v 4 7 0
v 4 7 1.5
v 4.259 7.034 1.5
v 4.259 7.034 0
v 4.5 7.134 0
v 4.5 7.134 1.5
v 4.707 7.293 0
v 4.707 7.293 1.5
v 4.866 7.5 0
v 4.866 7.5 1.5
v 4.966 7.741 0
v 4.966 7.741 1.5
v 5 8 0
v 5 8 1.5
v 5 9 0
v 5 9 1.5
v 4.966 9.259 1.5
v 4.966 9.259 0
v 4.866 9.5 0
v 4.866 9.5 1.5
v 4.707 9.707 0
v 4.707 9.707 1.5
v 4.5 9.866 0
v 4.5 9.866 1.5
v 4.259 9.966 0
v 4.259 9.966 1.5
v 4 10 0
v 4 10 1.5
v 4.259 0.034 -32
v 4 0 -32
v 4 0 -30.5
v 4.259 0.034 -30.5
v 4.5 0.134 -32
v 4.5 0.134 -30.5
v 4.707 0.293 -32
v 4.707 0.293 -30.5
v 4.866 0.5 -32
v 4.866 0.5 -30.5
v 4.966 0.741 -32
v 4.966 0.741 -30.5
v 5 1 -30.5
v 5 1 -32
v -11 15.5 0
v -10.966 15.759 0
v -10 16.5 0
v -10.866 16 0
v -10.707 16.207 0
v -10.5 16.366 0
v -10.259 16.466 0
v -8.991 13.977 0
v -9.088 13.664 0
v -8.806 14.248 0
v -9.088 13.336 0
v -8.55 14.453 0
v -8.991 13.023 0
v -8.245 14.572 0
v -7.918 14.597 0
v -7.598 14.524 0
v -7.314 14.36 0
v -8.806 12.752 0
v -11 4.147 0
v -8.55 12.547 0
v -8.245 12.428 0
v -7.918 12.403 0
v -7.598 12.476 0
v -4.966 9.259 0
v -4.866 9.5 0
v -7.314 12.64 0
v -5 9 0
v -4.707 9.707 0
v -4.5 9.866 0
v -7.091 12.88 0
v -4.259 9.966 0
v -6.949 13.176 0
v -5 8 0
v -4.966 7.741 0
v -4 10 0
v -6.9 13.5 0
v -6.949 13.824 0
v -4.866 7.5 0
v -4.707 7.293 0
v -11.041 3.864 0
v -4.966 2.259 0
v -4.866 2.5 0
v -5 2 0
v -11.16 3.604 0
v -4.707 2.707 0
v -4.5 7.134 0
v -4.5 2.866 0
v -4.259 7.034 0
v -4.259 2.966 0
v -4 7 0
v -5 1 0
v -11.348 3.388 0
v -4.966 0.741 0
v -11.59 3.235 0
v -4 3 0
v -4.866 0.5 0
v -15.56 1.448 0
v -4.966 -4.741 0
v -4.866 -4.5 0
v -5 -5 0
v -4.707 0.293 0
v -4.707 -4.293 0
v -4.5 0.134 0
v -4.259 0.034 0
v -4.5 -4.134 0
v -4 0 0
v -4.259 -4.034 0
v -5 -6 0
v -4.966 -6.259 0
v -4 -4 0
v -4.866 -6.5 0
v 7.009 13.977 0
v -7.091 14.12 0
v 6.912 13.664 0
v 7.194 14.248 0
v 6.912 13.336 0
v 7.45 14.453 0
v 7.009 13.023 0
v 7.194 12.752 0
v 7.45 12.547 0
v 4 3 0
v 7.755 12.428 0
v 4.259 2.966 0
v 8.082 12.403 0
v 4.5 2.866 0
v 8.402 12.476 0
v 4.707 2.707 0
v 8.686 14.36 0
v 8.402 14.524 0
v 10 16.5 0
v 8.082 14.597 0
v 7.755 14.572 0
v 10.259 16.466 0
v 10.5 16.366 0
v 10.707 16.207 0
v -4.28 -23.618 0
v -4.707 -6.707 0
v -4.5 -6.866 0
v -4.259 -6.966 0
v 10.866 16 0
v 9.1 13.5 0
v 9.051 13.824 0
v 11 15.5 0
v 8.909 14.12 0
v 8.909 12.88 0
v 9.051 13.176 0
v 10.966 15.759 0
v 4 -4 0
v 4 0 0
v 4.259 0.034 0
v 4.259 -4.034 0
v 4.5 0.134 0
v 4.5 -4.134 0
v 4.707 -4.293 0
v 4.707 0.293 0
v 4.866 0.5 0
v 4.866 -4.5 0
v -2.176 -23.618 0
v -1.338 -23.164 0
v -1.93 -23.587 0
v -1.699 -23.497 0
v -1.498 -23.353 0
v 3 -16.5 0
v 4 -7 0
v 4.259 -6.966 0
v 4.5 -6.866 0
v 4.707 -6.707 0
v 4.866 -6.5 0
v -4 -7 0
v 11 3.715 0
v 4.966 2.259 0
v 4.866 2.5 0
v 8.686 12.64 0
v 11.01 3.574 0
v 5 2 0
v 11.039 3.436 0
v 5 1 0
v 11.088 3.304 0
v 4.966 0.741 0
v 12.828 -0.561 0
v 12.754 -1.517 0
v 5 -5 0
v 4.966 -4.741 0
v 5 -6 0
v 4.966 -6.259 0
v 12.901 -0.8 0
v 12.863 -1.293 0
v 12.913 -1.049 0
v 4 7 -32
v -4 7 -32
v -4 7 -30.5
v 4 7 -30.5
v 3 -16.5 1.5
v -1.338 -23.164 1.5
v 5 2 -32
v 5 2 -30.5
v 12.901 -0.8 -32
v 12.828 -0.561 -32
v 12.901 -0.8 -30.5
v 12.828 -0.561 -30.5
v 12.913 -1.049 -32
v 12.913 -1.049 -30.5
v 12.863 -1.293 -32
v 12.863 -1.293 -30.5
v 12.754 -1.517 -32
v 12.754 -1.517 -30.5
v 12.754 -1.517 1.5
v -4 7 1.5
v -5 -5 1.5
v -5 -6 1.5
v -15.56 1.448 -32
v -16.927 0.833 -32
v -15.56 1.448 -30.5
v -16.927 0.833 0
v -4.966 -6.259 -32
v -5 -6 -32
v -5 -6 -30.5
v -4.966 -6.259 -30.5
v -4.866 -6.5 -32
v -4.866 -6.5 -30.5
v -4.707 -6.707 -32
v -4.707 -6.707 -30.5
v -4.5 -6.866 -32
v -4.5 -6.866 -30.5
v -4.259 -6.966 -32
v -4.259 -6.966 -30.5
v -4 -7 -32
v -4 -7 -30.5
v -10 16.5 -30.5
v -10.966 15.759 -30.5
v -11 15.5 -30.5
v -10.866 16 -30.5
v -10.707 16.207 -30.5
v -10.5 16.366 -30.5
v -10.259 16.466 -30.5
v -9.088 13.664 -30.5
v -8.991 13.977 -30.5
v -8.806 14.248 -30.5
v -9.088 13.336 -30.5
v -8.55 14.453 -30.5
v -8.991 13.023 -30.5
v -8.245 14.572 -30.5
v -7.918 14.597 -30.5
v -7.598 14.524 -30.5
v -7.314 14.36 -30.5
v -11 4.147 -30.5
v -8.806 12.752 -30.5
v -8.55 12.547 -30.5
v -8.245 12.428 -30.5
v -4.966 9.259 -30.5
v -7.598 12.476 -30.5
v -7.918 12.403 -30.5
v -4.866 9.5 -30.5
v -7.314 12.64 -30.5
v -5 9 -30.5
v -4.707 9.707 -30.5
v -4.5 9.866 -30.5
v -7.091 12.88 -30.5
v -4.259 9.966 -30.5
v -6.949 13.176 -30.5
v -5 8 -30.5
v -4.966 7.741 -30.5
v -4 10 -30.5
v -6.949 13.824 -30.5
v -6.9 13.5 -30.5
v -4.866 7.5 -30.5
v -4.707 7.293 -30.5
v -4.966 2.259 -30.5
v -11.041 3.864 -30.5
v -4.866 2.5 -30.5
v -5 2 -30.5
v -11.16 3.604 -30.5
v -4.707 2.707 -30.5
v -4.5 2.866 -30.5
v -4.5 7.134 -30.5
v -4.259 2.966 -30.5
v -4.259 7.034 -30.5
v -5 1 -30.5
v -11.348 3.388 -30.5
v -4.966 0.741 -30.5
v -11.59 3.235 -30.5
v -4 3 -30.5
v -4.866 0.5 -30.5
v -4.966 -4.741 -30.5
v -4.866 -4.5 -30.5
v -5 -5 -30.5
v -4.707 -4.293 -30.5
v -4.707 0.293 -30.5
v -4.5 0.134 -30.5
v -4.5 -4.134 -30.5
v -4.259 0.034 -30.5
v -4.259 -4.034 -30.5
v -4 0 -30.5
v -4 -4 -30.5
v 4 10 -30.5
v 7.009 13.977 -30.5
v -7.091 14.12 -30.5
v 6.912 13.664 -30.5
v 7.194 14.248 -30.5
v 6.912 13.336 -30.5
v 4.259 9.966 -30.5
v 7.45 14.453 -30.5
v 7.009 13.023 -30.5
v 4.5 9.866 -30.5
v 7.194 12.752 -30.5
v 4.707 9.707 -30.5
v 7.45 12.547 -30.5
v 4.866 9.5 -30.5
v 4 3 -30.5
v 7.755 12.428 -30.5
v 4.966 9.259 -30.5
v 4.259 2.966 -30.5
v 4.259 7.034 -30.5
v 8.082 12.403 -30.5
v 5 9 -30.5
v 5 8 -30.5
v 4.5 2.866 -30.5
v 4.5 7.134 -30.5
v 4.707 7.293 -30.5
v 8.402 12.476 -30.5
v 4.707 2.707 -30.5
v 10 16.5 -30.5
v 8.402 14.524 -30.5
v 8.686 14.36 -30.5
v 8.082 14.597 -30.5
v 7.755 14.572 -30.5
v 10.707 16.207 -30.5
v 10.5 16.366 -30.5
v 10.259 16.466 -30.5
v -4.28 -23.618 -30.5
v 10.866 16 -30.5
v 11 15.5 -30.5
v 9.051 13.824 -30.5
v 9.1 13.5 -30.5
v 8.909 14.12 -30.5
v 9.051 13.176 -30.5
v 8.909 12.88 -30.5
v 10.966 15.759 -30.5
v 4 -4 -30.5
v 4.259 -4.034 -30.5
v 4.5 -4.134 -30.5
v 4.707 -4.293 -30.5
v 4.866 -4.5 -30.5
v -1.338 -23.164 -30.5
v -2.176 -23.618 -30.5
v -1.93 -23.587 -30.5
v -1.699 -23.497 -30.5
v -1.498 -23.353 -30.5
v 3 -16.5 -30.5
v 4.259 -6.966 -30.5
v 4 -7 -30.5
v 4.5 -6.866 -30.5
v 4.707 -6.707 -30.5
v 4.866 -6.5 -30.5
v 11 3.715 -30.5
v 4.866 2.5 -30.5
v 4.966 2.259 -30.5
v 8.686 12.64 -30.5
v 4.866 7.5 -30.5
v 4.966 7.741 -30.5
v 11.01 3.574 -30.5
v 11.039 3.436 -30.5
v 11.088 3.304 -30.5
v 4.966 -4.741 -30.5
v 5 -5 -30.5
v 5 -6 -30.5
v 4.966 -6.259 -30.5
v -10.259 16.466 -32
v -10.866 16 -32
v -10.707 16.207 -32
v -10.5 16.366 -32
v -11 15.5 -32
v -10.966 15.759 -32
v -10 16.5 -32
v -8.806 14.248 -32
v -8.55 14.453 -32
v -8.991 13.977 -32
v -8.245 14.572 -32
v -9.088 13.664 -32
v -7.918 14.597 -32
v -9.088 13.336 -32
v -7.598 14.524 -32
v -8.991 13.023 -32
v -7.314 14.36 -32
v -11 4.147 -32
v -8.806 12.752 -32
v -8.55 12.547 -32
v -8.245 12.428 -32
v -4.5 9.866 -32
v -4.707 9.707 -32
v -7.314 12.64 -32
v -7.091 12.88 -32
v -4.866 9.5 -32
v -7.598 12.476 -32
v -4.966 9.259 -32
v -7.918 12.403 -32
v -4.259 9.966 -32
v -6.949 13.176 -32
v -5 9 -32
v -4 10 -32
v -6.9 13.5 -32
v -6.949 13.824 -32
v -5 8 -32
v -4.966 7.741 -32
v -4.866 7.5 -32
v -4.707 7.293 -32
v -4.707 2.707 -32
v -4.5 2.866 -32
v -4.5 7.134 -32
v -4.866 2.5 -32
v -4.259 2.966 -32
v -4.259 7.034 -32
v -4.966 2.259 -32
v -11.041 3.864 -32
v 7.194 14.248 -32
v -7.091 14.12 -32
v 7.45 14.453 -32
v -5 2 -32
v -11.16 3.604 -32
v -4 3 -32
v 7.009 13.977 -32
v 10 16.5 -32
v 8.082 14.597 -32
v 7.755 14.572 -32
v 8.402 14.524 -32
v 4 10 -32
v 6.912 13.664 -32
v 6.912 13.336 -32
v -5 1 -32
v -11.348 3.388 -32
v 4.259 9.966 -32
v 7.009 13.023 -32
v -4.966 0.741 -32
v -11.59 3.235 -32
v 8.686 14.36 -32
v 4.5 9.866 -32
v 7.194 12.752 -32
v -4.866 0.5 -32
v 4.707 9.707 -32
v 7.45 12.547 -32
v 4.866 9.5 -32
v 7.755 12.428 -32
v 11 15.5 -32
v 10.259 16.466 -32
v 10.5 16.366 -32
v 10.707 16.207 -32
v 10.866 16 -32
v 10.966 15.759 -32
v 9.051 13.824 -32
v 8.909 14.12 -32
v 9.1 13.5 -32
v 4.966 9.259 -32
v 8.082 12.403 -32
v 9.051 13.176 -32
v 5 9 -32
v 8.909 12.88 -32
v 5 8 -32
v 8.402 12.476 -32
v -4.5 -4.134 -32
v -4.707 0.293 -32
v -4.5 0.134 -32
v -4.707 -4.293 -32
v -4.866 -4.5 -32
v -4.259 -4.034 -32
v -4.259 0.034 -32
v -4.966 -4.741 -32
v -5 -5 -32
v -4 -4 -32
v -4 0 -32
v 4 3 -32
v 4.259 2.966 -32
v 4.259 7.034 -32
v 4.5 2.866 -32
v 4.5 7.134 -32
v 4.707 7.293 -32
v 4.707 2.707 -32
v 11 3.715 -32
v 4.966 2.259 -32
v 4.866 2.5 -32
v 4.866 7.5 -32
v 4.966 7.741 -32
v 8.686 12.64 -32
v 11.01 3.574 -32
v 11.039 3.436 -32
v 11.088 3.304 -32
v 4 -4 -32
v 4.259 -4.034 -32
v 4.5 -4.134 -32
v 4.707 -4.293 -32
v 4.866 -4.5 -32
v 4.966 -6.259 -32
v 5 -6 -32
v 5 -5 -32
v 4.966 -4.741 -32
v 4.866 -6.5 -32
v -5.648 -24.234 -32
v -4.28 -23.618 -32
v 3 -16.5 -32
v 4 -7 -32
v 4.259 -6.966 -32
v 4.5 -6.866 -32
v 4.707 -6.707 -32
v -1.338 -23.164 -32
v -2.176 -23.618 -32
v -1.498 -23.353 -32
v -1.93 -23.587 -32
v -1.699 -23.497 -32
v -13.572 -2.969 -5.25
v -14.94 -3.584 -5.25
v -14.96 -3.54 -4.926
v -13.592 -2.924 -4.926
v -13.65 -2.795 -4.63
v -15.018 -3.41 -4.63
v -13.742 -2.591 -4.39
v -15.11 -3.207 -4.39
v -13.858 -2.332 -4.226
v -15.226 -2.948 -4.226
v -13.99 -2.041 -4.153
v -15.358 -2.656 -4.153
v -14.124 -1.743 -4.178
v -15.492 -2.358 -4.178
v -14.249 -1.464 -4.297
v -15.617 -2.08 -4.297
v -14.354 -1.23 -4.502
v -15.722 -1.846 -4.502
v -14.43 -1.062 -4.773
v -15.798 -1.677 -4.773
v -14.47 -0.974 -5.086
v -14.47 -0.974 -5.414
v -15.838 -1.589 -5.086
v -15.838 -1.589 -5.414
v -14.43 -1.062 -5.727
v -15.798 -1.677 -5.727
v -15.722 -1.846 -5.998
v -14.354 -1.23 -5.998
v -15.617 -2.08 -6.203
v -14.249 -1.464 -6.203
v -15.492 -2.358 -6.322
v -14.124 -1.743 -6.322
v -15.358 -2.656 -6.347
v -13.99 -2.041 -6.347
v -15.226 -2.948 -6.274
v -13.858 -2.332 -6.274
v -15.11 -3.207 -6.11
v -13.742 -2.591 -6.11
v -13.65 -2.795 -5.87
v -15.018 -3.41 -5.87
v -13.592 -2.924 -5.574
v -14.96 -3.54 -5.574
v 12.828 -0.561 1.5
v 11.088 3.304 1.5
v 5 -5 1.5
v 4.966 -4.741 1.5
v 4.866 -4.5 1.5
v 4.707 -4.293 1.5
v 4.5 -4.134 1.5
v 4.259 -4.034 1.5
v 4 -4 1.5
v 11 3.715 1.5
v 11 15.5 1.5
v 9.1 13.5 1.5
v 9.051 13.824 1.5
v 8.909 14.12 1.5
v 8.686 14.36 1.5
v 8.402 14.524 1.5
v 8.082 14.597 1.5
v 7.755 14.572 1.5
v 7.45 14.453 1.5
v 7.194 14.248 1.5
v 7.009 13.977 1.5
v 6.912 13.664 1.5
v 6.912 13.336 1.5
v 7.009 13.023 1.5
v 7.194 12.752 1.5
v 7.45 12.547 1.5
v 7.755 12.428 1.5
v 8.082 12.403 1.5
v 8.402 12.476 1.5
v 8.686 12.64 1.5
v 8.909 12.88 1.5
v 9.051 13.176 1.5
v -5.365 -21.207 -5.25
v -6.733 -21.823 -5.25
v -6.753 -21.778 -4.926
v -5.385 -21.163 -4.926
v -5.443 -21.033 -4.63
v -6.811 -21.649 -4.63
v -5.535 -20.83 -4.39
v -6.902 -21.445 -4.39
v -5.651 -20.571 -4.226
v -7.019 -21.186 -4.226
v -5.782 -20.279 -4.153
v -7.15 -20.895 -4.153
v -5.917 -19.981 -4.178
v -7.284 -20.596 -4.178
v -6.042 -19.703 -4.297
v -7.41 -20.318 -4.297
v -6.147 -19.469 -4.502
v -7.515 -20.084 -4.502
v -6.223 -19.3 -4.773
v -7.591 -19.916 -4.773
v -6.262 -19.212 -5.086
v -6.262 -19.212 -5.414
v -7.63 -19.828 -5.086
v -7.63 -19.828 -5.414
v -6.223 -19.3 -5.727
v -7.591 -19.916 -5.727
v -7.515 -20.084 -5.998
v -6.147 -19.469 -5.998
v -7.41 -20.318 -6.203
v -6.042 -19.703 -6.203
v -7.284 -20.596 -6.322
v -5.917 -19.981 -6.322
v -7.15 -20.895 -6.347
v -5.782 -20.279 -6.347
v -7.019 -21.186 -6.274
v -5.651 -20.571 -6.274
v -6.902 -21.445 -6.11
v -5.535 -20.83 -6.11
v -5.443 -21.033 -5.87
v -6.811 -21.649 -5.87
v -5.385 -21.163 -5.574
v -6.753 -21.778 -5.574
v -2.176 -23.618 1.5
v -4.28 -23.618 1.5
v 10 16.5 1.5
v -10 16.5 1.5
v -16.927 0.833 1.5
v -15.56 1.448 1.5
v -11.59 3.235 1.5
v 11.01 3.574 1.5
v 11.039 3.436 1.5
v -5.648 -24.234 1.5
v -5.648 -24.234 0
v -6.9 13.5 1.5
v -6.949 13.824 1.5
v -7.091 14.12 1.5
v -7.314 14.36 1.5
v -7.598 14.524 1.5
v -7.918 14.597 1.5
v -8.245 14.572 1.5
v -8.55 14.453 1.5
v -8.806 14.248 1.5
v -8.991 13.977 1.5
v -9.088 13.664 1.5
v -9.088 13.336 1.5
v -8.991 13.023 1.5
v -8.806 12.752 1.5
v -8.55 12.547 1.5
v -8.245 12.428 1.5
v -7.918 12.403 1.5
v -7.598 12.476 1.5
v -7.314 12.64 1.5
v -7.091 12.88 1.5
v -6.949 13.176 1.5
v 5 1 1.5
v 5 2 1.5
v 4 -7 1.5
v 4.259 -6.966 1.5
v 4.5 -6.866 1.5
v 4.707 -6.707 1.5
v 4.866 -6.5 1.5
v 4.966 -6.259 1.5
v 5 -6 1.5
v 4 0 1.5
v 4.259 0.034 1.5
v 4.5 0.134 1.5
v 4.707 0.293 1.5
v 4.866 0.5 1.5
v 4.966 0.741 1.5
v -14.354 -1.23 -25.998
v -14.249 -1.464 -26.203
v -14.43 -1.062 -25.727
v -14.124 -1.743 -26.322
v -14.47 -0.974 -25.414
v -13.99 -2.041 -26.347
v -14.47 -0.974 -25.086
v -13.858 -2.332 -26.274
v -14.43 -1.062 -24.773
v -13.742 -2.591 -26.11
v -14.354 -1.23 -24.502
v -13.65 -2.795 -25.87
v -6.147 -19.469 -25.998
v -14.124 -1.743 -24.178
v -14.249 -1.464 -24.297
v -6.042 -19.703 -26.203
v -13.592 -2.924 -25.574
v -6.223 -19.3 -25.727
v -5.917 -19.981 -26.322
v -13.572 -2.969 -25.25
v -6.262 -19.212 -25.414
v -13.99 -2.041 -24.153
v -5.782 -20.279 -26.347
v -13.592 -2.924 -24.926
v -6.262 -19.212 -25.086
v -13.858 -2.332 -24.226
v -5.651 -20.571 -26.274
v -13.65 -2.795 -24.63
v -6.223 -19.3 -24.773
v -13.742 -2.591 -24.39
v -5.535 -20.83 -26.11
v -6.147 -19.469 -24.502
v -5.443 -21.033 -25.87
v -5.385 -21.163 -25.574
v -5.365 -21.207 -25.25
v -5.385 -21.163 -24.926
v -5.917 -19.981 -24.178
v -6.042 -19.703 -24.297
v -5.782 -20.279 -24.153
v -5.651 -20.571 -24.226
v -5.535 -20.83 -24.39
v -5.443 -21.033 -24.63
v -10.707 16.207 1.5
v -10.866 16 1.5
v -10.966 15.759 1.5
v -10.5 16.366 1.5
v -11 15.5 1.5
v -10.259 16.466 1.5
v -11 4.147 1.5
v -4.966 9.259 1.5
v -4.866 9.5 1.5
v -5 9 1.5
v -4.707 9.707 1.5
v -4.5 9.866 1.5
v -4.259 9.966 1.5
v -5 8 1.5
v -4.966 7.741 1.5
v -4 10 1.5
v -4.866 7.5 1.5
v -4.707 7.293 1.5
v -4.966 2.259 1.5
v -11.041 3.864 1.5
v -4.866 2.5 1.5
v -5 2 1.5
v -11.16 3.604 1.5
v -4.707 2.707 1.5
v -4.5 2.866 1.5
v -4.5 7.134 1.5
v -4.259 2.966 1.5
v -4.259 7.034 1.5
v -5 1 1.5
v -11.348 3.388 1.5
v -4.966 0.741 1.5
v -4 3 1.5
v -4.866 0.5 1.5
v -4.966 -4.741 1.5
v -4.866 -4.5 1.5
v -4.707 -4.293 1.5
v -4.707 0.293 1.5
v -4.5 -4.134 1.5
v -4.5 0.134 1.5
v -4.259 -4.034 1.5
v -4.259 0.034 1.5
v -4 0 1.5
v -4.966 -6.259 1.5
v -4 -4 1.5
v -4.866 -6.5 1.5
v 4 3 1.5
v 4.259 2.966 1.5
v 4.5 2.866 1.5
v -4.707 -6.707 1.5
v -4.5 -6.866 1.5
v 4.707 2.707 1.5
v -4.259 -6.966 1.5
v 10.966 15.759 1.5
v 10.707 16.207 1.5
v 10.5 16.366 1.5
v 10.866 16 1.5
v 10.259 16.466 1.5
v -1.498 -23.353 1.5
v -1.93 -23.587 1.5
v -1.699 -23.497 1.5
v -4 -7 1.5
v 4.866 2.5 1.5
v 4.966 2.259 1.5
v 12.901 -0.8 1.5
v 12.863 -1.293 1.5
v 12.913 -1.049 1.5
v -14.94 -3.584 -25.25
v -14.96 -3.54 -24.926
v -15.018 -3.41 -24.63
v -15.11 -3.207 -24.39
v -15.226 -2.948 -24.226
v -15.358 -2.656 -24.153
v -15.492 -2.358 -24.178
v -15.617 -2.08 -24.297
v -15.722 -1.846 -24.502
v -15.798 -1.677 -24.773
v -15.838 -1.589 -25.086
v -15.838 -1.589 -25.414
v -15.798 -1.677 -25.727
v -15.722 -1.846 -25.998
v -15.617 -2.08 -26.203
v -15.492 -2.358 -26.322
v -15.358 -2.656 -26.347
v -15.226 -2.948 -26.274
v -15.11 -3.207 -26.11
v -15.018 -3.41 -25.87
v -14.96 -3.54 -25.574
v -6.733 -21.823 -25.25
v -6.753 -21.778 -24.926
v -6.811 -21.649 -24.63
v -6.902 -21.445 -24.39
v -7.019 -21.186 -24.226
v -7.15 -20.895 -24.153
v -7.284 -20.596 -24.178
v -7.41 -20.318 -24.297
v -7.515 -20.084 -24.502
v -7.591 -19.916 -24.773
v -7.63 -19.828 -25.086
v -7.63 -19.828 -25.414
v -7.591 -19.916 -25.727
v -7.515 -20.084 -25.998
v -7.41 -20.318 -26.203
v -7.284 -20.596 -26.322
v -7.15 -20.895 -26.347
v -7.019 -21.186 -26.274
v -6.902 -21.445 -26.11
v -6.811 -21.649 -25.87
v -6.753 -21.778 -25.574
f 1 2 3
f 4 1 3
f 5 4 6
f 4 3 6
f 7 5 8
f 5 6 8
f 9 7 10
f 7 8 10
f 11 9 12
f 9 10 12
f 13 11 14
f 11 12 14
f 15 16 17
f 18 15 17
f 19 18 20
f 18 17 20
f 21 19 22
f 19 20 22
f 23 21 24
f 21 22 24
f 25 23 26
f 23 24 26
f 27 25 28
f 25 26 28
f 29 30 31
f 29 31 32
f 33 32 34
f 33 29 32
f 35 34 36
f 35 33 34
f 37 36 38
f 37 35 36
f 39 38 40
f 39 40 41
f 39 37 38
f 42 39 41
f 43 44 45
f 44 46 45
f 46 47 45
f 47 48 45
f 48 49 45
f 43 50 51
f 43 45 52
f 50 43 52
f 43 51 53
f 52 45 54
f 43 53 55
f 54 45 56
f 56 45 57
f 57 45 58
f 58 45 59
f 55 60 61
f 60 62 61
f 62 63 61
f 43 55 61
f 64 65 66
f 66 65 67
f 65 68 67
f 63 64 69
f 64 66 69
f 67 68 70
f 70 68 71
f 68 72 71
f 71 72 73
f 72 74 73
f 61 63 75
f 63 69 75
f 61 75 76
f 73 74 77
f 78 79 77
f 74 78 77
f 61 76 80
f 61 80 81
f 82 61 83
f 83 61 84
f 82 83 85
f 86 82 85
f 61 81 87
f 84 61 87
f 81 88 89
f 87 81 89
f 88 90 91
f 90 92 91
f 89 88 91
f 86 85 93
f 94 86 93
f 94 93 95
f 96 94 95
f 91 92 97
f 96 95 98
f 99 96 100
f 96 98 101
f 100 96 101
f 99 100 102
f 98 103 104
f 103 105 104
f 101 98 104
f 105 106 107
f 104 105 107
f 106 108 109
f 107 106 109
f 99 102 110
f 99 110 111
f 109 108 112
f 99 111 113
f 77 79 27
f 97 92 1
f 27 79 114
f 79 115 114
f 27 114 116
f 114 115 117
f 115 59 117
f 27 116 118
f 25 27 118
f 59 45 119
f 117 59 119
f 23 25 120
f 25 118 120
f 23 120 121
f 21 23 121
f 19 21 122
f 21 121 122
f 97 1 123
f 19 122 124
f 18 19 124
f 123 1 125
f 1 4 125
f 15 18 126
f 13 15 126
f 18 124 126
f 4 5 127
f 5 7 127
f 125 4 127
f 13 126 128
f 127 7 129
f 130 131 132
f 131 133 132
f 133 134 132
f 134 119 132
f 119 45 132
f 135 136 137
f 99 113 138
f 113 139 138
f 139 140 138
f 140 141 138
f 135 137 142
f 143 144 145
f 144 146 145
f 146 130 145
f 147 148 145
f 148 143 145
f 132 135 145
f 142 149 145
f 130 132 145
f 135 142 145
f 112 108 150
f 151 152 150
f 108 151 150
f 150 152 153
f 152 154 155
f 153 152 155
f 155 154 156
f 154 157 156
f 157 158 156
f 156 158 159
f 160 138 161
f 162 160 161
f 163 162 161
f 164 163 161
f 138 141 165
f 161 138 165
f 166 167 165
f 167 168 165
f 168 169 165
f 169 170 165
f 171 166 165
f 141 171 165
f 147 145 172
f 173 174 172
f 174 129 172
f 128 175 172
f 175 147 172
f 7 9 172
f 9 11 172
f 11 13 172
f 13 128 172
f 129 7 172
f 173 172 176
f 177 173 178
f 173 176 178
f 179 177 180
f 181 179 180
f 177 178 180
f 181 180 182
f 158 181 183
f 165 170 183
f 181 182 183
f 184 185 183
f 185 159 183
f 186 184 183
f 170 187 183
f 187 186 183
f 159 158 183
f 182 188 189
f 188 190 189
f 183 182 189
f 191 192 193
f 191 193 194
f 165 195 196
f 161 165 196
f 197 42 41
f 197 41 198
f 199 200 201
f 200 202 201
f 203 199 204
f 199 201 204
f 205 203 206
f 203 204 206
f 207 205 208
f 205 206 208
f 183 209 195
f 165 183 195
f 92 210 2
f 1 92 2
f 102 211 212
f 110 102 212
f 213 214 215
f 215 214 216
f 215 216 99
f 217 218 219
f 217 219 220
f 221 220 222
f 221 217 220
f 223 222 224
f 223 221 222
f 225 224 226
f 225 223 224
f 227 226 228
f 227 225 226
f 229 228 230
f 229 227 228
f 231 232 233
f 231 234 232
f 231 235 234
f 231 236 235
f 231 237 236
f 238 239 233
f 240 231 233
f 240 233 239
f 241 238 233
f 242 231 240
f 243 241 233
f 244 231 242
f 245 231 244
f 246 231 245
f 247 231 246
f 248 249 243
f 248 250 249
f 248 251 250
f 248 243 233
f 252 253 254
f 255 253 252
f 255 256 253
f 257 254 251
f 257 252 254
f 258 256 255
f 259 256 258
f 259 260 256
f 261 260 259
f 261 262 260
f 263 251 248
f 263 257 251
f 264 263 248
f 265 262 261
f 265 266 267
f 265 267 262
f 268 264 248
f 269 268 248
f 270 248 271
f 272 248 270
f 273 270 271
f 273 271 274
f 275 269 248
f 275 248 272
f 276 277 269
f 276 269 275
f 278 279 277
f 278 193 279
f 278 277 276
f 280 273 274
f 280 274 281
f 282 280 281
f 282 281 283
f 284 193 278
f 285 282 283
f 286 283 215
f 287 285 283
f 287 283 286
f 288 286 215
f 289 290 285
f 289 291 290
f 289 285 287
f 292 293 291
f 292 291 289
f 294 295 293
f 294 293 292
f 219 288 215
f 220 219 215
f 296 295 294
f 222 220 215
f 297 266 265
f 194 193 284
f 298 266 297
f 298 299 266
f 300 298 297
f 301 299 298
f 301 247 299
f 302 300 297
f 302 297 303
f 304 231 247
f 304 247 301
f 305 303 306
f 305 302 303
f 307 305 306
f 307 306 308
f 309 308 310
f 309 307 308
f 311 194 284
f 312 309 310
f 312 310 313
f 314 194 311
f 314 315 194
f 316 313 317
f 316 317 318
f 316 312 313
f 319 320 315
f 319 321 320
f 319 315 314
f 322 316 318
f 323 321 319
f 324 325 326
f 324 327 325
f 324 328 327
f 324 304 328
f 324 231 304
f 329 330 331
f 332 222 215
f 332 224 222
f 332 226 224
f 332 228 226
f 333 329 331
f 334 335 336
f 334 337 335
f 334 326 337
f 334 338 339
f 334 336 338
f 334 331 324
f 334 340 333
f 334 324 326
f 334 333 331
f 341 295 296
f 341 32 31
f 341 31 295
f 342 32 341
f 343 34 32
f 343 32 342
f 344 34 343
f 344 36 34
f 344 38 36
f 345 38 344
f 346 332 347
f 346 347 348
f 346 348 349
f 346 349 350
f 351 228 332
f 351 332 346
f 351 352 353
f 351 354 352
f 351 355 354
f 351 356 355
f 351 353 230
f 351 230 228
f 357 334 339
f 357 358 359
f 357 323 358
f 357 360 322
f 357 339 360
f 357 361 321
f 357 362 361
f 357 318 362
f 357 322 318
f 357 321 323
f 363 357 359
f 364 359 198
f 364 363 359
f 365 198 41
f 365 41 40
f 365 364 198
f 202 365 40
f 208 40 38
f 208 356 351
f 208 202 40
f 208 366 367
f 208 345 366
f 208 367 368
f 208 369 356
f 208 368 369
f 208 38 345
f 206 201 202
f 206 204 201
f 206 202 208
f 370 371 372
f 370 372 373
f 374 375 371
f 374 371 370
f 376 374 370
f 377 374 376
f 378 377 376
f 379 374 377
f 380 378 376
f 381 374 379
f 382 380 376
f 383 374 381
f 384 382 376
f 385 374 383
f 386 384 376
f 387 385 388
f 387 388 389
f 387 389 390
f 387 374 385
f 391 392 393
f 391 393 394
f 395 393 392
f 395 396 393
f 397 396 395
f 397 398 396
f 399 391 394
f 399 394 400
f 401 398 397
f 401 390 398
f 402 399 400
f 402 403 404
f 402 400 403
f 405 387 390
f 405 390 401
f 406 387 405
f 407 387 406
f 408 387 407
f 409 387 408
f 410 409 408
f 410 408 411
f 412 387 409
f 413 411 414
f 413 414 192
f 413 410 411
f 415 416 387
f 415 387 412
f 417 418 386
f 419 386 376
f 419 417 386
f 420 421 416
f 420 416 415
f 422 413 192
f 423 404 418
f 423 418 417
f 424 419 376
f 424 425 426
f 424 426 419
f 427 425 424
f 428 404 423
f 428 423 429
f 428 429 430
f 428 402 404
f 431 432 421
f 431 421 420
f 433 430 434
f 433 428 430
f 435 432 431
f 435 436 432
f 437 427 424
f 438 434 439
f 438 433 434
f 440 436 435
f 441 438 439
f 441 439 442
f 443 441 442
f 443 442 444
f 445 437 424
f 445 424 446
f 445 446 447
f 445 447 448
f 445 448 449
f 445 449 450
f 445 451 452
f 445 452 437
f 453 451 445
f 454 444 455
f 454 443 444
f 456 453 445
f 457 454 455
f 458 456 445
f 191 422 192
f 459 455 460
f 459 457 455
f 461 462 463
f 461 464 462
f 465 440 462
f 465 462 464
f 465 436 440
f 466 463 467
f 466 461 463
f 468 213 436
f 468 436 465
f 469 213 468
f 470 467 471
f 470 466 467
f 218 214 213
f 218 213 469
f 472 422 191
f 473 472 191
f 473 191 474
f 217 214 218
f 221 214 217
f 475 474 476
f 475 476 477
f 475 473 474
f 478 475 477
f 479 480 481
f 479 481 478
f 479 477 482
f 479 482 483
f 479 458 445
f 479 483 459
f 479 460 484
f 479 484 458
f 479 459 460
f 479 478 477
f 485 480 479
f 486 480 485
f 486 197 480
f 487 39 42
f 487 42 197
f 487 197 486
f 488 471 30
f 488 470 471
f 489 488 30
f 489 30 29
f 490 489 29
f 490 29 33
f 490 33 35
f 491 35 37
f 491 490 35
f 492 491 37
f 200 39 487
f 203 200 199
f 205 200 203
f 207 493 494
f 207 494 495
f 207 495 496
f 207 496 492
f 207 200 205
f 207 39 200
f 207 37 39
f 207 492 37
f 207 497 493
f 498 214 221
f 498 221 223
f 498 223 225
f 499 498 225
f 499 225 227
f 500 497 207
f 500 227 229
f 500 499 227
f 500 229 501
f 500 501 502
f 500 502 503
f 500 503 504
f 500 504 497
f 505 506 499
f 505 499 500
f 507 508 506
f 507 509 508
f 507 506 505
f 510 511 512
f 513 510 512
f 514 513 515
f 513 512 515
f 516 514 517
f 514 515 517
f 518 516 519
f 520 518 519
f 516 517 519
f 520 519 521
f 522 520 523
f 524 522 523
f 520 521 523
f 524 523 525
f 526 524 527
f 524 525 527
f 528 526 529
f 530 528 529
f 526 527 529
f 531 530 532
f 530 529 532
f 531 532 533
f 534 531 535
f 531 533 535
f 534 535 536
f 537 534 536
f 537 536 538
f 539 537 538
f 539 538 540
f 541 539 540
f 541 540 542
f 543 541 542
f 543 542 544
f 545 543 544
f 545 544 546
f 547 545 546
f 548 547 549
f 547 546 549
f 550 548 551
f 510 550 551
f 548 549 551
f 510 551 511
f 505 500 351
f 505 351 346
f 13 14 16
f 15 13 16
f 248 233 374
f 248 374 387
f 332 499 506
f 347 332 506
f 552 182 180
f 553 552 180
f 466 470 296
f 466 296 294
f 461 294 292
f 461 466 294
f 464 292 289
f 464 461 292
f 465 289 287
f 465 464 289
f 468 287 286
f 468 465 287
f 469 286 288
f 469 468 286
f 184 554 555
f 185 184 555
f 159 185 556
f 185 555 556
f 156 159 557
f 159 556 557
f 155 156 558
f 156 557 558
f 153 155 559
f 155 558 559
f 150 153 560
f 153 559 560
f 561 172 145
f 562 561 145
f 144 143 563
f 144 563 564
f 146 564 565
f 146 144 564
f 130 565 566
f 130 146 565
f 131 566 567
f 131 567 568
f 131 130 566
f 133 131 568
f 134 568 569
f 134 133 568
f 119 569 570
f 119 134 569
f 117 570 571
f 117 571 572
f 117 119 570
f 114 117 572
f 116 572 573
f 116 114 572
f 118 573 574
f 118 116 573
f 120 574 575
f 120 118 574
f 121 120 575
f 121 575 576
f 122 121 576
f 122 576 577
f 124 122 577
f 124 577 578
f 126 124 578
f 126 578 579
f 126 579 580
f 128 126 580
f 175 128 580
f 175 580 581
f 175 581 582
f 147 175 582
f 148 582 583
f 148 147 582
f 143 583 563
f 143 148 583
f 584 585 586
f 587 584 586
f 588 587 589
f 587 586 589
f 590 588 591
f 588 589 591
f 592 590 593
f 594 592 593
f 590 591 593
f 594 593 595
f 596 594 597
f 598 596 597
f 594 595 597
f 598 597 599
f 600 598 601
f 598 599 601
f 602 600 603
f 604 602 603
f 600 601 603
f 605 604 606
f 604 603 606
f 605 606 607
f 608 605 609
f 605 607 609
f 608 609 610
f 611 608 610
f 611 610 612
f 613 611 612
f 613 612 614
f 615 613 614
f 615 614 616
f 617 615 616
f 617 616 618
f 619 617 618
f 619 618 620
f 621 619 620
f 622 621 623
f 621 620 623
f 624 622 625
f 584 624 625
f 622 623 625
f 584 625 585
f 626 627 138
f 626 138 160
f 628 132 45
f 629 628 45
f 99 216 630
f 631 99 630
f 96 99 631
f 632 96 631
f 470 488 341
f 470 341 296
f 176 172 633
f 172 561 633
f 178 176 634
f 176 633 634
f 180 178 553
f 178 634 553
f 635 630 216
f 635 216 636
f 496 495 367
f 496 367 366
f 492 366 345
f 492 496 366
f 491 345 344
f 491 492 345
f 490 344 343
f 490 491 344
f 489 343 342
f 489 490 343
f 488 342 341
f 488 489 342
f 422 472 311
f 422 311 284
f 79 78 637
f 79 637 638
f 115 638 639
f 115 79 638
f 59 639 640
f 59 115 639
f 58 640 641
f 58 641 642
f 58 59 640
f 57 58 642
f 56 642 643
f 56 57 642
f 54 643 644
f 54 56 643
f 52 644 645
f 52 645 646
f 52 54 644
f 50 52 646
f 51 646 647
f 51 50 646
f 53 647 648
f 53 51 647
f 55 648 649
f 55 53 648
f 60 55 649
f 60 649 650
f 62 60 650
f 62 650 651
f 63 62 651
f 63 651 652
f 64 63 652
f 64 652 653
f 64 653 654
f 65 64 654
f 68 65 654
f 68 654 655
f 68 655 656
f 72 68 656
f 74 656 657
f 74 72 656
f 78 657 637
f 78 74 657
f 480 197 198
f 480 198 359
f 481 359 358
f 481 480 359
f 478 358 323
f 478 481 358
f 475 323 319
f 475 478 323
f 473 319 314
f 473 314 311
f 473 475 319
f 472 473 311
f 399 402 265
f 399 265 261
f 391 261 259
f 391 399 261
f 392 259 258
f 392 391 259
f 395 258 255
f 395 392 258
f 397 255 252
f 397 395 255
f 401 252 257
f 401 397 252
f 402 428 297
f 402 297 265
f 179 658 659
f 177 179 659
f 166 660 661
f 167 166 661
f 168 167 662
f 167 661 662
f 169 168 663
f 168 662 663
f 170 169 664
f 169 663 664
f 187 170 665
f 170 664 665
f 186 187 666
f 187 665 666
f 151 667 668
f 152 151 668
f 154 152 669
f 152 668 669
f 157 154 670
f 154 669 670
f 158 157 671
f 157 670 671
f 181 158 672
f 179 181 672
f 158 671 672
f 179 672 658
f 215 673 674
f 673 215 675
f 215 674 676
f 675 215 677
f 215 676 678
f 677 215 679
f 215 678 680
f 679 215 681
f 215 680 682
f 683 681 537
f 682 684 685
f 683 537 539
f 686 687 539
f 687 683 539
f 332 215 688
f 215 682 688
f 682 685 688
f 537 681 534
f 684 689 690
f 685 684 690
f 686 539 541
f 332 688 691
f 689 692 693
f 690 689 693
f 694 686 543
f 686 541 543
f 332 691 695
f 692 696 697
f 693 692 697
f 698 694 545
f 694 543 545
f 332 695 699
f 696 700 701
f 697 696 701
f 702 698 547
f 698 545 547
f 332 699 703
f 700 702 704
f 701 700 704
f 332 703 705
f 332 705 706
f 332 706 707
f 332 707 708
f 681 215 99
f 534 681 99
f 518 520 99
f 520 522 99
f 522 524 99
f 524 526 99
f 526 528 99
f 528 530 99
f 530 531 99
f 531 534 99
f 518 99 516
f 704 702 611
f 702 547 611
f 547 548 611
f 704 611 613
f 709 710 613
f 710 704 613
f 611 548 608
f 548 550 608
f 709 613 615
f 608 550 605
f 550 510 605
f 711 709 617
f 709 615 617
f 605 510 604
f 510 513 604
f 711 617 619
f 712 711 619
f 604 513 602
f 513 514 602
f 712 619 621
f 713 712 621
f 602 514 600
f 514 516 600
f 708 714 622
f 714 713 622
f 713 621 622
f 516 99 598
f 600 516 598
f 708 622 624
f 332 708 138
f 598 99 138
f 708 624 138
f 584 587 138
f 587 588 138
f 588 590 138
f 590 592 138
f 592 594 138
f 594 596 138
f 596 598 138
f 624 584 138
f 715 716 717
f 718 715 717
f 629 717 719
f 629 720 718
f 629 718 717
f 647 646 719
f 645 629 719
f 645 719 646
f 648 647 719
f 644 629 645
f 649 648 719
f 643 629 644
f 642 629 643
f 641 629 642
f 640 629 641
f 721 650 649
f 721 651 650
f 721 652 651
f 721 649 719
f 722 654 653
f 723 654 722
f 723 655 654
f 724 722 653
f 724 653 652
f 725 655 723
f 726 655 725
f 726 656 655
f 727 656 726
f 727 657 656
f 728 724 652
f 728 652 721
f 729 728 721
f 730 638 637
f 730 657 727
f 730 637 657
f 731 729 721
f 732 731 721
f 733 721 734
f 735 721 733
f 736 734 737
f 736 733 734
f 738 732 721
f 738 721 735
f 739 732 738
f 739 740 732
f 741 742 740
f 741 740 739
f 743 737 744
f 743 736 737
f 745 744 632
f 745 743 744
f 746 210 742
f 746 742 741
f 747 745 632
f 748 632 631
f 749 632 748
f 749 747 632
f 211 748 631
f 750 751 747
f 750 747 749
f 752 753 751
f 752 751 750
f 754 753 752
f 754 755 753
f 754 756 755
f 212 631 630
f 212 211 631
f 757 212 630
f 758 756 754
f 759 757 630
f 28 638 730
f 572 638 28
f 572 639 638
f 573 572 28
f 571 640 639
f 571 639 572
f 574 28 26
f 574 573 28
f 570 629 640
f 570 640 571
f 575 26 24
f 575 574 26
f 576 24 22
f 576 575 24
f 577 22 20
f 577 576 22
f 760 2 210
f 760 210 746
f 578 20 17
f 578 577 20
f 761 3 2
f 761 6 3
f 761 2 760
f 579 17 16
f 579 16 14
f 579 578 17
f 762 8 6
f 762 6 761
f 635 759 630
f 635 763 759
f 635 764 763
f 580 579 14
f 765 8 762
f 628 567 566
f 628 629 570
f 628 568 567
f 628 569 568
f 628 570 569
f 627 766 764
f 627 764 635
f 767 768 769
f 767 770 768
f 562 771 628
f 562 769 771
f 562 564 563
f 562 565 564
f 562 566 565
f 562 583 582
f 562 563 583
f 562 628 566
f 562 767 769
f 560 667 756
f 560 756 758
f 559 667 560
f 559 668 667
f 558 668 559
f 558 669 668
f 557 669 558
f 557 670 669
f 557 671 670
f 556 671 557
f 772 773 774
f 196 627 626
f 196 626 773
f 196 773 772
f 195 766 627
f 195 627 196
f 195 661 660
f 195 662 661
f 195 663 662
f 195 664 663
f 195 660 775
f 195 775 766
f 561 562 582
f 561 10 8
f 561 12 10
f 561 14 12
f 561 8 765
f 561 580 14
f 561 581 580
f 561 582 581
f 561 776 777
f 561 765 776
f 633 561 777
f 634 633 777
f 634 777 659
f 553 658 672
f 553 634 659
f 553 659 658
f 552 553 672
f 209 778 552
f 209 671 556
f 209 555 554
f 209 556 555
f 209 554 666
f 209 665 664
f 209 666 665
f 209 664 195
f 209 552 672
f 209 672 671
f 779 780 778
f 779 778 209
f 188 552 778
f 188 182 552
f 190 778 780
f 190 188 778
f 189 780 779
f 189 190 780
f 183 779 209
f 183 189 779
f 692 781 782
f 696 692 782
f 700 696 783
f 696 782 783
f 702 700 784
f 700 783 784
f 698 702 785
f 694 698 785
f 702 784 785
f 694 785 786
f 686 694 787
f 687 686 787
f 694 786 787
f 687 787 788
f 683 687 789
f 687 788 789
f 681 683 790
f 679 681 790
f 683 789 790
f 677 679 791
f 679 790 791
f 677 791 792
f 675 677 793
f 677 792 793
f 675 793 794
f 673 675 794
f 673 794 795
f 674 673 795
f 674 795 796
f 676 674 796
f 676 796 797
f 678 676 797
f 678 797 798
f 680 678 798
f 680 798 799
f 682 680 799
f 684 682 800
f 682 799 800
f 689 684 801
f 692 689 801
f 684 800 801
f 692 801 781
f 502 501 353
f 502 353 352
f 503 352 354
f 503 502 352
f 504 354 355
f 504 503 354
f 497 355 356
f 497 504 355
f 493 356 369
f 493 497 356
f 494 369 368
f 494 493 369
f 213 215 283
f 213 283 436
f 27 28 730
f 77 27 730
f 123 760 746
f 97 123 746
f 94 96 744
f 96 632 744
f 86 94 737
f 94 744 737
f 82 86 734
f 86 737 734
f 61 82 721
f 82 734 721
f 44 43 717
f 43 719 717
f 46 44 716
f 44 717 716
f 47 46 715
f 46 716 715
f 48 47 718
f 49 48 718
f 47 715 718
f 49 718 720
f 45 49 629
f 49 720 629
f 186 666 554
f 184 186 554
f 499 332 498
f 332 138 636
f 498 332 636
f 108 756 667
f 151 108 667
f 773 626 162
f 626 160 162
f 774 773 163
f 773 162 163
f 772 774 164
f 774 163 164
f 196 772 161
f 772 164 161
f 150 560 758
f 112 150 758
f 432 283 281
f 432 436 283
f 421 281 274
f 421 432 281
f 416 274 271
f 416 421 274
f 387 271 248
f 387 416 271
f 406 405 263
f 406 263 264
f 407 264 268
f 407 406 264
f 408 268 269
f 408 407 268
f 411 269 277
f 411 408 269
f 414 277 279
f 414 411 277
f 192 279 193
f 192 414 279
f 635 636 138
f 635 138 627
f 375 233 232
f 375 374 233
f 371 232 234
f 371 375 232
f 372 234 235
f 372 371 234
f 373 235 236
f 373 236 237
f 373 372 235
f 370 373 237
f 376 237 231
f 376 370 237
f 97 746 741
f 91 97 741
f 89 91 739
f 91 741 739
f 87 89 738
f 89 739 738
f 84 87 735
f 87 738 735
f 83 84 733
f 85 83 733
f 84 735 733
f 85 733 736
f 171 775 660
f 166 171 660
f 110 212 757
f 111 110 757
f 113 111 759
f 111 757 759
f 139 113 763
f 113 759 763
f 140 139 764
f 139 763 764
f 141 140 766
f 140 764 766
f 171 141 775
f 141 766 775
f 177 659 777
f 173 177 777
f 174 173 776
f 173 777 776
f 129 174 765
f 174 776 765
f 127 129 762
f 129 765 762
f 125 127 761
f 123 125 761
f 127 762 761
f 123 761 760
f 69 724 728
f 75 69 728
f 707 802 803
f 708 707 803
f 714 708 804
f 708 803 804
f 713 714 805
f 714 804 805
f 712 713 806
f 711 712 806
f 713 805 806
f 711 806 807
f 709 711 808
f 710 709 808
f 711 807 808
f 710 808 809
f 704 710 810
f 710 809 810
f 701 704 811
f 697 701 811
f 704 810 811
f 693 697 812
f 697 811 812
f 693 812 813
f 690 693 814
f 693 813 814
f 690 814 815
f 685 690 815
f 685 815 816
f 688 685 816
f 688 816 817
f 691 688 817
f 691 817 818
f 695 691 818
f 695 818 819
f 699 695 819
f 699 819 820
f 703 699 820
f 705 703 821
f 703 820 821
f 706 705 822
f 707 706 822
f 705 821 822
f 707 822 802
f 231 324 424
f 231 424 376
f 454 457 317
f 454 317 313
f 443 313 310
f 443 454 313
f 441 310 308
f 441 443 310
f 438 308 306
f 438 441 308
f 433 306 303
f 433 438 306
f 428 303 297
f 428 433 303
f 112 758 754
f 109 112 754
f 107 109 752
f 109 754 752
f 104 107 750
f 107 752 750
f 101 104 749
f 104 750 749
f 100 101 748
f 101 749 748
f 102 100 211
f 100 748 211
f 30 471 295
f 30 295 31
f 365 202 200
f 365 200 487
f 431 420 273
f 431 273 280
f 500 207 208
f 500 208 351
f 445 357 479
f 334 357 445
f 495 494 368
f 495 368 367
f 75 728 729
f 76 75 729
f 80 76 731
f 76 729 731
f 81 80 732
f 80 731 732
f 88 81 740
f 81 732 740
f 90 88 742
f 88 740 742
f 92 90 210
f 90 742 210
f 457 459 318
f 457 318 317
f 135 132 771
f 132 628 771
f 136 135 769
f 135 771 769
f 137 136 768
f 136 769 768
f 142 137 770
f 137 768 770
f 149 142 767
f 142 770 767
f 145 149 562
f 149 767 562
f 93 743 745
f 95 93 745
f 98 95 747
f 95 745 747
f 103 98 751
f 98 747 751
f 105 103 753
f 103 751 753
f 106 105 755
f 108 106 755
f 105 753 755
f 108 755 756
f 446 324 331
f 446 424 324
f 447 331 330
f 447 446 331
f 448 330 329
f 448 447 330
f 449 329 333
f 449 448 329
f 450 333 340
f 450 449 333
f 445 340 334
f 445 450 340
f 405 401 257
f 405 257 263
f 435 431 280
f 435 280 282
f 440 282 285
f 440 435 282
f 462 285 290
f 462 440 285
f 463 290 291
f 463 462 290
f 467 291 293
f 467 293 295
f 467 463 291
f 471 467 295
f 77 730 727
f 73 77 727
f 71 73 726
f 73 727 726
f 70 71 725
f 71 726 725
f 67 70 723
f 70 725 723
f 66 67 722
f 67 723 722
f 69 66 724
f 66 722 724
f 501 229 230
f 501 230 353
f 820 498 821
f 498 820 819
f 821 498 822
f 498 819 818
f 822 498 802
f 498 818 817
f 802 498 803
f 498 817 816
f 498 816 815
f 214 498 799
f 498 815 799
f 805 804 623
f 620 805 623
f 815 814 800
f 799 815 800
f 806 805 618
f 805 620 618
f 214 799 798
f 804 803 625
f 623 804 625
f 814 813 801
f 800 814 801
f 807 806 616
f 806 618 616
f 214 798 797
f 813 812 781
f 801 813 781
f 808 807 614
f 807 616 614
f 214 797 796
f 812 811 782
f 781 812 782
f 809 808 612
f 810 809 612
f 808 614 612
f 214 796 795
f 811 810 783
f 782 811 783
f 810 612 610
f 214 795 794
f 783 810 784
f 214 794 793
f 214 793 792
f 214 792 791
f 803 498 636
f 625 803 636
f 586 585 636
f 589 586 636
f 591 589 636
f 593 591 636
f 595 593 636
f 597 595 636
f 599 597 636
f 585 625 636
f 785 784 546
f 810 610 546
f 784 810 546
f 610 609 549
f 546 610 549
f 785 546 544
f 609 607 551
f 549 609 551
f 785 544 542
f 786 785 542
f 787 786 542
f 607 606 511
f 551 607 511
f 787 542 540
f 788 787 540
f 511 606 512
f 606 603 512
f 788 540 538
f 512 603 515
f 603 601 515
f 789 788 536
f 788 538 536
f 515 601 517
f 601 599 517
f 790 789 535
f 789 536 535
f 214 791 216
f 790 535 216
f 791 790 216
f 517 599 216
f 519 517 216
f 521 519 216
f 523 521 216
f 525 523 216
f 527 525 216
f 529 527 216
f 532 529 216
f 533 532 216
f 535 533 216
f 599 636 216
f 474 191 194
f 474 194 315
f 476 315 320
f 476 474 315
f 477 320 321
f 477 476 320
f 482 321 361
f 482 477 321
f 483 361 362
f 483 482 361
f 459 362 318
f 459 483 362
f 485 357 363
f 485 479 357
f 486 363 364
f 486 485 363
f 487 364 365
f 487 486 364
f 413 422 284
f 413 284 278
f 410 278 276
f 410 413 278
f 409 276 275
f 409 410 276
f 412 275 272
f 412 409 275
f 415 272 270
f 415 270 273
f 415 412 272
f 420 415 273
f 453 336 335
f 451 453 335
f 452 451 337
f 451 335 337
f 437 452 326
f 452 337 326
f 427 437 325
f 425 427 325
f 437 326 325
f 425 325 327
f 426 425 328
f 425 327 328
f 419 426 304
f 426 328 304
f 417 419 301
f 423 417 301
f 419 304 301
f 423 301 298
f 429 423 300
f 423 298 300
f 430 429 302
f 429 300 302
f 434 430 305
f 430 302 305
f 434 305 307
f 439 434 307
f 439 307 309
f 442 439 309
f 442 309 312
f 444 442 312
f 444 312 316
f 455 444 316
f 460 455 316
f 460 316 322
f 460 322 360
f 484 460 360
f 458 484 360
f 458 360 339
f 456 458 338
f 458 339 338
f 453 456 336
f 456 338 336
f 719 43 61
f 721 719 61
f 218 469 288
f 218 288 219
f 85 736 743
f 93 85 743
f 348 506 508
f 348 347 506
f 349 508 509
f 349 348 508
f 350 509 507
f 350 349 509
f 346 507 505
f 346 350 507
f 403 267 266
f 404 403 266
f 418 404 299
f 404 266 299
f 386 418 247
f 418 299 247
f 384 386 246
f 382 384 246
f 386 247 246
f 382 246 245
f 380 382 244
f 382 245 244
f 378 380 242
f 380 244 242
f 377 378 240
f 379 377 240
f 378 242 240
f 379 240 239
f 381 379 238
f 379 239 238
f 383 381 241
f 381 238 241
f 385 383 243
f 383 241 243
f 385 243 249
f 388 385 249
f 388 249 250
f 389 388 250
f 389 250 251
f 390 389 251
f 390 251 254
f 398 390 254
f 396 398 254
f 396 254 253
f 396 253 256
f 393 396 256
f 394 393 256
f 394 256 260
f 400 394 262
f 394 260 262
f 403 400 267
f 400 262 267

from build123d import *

# Parameters (mm, degrees)
F0_R      = 1.1
F1_DEPTH  = 1.5
F3_DEPTH  = 1.5
F4_W      = 21.9317121995
F4_H      = 1.5
F5_DEPTH  = 5
F7_DEPTH  = 1.5
F9_DEPTH  = 1.5
F10_R     = 1
F11_W     = 27.487267755
F11_H     = 1.5
F12_DEPTH = 1.5
F14_DEPTH = 32
F17_R     = 1.1
F18_DEPTH = 1.5


with BuildPart() as f1:
    # F0 (on Top) → F1 (new body)
    with BuildSketch(Plane.XY):
        Polygon((11, 3.5), (11, 16.5), (-11, 16.5), (-11, 3.5), (-2, -16.5), (11, -16.5), align=None)
        with Locations((-8, 13.5)):
            Circle(F0_R, mode=Mode.SUBTRACT)
        with Locations((8, 13.5)):
            Circle(F0_R, mode=Mode.SUBTRACT)
        Polygon((20, -16.5), (11, 3.5), (11, -16.5), align=None)
    extrude(amount=F1_DEPTH)

    # F2 (on face) → F3 (cut, through all)
    with BuildSketch(Plane.XY.offset(1.5)):
        Polygon((13.0518233866, -1.0596075259), (3, -16.5), (20, -16.5), align=None)
        with BuildLine():
            Line((4, 10), (-4, 10))
            ThreePointArc((-4, 10), (-4.7071067812, 9.7071067812), (-5, 9))
            Line((-5, 9), (-5, 8))
            ThreePointArc((-5, 8), (-4.7071067812, 7.2928932188), (-4, 7))
            Line((-4, 7), (4, 7))
            ThreePointArc((4, 7), (4.7071067812, 7.2928932188), (5, 8))
            Line((5, 8), (5, 9))
            ThreePointArc((5, 9), (4.7071067812, 9.7071067812), (4, 10))
        make_face()
        with BuildLine():
            Line((4, 3), (-4, 3))
            ThreePointArc((-4, 3), (-4.7071067812, 2.7071067812), (-5, 2))
            Line((-5, 2), (-5, 1))
            ThreePointArc((-5, 1), (-4.7071067812, 0.2928932188), (-4, 0))
            Line((-4, 0), (4, 0))
            ThreePointArc((4, 0), (4.7071067812, 0.2928932188), (5, 1))
            Line((5, 1), (5, 2))
            ThreePointArc((5, 2), (4.7071067812, 2.7071067812), (4, 3))
        make_face()
        with BuildLine():
            Line((4, -4), (-4, -4))
            ThreePointArc((-4, -4), (-4.7071067812, -4.2928932188), (-5, -5))
            Line((-5, -5), (-5, -6))
            ThreePointArc((-5, -6), (-4.7071067812, -6.7071067812), (-4, -7))
            Line((-4, -7), (4, -7))
            ThreePointArc((4, -7), (4.7071067812, -6.7071067812), (5, -6))
            Line((5, -6), (5, -5))
            ThreePointArc((5, -5), (4.7071067812, -4.2928932188), (4, -4))
        make_face()
    extrude(amount=-F3_DEPTH, mode=Mode.SUBTRACT)

    # F4 (on face) → F5 (join)
    with BuildSketch(Plane(origin=(-7.8378378378, -3.527027027, 0), x_dir=(0.4103646773, -0.9119215052, 0), z_dir=(-0.9119215052, -0.4103646773, 0))):
        with Locations((3.260119381, 0.75)):
            Rectangle(F4_W, F4_H)
    extrude(amount=F5_DEPTH)

    # F6 (on face) → F7 (join)
    with BuildSketch(Plane.XY.offset(1.5)):
        Polygon((-2, -16.5), (-6.5596075259, -18.5518233866), (-4.2798037629, -23.618053971), (3, -23.618053971), (3, -16.5), align=None)
    extrude(amount=-F7_DEPTH)

    # F8 (on face) → F9 (cut, through all)
    with BuildSketch(Plane.XY.offset(1.5)):
        Polygon((3, -23.618053971), (3, -16.5), (-1.6339120908, -23.618053971), align=None)
    extrude(amount=-F9_DEPTH, mode=Mode.SUBTRACT)

    # F10
    f10_edges = [f1.edges().sort_by_distance(p)[0] for p in [
        (-11, 16.5, 0.75),
        (11, 16.5, 0.75),
        (-11, 3.5, 0.75),
        (-1.633912, -23.618054, 0.75),
        (13.051823, -1.059608, 0.75),
        (11, 3.5, 0.75),
    ]]
    fillet(f10_edges, radius=F10_R)

    # F11 (on face) → F12 (join)
    with BuildSketch(Plane(origin=(-12.3974453637, -5.5788504137, 0), x_dir=(0.4103646773, -0.9119215052, 0), z_dir=(-0.9119215052, -0.4103646773, 0))):
        with Locations((6.0378971588, 0.75)):
            Rectangle(F11_W, F11_H)
    extrude(amount=F12_DEPTH)

    # F13 (on face) → F14 (join)
    with BuildSketch(Plane(origin=(0, 0, 0), x_dir=(1, 0, 0), z_dir=(0, 0, -1))):
        Polygon((-15.5596075259, -1.4481766134), (-4.2798037629, 23.618053971), (-5.6476860207, 24.2336009869), (-16.9274897836, -0.8326295974), align=None)
    extrude(amount=F14_DEPTH)

    # F16: F1 across plane


with BuildPart() as f1_1:
    add(f1.part)
    add(f1.part.mirror(Plane.XY.offset(-15.25)))

    # F17 (on face) → F18 (cut, through all)
    with BuildSketch(Plane(origin=(-13.7653276215, -6.1943974297, 0), x_dir=(0.4103646773, -0.9119215052, 0), z_dir=(-0.9119215052, -0.4103646773, 0))):
        with Locations((-3.9621028412, -25.25)):
            Circle(F17_R)
        with Locations((16.0378971588, -25.25)):
            Circle(F17_R)
        with Locations((-3.9621028412, -5.25)):
            Circle(F17_R)
        with Locations((16.0378971588, -5.25)):
            Circle(F17_R)
    extrude(amount=-F18_DEPTH, mode=Mode.SUBTRACT)


solid = f1_1.part
